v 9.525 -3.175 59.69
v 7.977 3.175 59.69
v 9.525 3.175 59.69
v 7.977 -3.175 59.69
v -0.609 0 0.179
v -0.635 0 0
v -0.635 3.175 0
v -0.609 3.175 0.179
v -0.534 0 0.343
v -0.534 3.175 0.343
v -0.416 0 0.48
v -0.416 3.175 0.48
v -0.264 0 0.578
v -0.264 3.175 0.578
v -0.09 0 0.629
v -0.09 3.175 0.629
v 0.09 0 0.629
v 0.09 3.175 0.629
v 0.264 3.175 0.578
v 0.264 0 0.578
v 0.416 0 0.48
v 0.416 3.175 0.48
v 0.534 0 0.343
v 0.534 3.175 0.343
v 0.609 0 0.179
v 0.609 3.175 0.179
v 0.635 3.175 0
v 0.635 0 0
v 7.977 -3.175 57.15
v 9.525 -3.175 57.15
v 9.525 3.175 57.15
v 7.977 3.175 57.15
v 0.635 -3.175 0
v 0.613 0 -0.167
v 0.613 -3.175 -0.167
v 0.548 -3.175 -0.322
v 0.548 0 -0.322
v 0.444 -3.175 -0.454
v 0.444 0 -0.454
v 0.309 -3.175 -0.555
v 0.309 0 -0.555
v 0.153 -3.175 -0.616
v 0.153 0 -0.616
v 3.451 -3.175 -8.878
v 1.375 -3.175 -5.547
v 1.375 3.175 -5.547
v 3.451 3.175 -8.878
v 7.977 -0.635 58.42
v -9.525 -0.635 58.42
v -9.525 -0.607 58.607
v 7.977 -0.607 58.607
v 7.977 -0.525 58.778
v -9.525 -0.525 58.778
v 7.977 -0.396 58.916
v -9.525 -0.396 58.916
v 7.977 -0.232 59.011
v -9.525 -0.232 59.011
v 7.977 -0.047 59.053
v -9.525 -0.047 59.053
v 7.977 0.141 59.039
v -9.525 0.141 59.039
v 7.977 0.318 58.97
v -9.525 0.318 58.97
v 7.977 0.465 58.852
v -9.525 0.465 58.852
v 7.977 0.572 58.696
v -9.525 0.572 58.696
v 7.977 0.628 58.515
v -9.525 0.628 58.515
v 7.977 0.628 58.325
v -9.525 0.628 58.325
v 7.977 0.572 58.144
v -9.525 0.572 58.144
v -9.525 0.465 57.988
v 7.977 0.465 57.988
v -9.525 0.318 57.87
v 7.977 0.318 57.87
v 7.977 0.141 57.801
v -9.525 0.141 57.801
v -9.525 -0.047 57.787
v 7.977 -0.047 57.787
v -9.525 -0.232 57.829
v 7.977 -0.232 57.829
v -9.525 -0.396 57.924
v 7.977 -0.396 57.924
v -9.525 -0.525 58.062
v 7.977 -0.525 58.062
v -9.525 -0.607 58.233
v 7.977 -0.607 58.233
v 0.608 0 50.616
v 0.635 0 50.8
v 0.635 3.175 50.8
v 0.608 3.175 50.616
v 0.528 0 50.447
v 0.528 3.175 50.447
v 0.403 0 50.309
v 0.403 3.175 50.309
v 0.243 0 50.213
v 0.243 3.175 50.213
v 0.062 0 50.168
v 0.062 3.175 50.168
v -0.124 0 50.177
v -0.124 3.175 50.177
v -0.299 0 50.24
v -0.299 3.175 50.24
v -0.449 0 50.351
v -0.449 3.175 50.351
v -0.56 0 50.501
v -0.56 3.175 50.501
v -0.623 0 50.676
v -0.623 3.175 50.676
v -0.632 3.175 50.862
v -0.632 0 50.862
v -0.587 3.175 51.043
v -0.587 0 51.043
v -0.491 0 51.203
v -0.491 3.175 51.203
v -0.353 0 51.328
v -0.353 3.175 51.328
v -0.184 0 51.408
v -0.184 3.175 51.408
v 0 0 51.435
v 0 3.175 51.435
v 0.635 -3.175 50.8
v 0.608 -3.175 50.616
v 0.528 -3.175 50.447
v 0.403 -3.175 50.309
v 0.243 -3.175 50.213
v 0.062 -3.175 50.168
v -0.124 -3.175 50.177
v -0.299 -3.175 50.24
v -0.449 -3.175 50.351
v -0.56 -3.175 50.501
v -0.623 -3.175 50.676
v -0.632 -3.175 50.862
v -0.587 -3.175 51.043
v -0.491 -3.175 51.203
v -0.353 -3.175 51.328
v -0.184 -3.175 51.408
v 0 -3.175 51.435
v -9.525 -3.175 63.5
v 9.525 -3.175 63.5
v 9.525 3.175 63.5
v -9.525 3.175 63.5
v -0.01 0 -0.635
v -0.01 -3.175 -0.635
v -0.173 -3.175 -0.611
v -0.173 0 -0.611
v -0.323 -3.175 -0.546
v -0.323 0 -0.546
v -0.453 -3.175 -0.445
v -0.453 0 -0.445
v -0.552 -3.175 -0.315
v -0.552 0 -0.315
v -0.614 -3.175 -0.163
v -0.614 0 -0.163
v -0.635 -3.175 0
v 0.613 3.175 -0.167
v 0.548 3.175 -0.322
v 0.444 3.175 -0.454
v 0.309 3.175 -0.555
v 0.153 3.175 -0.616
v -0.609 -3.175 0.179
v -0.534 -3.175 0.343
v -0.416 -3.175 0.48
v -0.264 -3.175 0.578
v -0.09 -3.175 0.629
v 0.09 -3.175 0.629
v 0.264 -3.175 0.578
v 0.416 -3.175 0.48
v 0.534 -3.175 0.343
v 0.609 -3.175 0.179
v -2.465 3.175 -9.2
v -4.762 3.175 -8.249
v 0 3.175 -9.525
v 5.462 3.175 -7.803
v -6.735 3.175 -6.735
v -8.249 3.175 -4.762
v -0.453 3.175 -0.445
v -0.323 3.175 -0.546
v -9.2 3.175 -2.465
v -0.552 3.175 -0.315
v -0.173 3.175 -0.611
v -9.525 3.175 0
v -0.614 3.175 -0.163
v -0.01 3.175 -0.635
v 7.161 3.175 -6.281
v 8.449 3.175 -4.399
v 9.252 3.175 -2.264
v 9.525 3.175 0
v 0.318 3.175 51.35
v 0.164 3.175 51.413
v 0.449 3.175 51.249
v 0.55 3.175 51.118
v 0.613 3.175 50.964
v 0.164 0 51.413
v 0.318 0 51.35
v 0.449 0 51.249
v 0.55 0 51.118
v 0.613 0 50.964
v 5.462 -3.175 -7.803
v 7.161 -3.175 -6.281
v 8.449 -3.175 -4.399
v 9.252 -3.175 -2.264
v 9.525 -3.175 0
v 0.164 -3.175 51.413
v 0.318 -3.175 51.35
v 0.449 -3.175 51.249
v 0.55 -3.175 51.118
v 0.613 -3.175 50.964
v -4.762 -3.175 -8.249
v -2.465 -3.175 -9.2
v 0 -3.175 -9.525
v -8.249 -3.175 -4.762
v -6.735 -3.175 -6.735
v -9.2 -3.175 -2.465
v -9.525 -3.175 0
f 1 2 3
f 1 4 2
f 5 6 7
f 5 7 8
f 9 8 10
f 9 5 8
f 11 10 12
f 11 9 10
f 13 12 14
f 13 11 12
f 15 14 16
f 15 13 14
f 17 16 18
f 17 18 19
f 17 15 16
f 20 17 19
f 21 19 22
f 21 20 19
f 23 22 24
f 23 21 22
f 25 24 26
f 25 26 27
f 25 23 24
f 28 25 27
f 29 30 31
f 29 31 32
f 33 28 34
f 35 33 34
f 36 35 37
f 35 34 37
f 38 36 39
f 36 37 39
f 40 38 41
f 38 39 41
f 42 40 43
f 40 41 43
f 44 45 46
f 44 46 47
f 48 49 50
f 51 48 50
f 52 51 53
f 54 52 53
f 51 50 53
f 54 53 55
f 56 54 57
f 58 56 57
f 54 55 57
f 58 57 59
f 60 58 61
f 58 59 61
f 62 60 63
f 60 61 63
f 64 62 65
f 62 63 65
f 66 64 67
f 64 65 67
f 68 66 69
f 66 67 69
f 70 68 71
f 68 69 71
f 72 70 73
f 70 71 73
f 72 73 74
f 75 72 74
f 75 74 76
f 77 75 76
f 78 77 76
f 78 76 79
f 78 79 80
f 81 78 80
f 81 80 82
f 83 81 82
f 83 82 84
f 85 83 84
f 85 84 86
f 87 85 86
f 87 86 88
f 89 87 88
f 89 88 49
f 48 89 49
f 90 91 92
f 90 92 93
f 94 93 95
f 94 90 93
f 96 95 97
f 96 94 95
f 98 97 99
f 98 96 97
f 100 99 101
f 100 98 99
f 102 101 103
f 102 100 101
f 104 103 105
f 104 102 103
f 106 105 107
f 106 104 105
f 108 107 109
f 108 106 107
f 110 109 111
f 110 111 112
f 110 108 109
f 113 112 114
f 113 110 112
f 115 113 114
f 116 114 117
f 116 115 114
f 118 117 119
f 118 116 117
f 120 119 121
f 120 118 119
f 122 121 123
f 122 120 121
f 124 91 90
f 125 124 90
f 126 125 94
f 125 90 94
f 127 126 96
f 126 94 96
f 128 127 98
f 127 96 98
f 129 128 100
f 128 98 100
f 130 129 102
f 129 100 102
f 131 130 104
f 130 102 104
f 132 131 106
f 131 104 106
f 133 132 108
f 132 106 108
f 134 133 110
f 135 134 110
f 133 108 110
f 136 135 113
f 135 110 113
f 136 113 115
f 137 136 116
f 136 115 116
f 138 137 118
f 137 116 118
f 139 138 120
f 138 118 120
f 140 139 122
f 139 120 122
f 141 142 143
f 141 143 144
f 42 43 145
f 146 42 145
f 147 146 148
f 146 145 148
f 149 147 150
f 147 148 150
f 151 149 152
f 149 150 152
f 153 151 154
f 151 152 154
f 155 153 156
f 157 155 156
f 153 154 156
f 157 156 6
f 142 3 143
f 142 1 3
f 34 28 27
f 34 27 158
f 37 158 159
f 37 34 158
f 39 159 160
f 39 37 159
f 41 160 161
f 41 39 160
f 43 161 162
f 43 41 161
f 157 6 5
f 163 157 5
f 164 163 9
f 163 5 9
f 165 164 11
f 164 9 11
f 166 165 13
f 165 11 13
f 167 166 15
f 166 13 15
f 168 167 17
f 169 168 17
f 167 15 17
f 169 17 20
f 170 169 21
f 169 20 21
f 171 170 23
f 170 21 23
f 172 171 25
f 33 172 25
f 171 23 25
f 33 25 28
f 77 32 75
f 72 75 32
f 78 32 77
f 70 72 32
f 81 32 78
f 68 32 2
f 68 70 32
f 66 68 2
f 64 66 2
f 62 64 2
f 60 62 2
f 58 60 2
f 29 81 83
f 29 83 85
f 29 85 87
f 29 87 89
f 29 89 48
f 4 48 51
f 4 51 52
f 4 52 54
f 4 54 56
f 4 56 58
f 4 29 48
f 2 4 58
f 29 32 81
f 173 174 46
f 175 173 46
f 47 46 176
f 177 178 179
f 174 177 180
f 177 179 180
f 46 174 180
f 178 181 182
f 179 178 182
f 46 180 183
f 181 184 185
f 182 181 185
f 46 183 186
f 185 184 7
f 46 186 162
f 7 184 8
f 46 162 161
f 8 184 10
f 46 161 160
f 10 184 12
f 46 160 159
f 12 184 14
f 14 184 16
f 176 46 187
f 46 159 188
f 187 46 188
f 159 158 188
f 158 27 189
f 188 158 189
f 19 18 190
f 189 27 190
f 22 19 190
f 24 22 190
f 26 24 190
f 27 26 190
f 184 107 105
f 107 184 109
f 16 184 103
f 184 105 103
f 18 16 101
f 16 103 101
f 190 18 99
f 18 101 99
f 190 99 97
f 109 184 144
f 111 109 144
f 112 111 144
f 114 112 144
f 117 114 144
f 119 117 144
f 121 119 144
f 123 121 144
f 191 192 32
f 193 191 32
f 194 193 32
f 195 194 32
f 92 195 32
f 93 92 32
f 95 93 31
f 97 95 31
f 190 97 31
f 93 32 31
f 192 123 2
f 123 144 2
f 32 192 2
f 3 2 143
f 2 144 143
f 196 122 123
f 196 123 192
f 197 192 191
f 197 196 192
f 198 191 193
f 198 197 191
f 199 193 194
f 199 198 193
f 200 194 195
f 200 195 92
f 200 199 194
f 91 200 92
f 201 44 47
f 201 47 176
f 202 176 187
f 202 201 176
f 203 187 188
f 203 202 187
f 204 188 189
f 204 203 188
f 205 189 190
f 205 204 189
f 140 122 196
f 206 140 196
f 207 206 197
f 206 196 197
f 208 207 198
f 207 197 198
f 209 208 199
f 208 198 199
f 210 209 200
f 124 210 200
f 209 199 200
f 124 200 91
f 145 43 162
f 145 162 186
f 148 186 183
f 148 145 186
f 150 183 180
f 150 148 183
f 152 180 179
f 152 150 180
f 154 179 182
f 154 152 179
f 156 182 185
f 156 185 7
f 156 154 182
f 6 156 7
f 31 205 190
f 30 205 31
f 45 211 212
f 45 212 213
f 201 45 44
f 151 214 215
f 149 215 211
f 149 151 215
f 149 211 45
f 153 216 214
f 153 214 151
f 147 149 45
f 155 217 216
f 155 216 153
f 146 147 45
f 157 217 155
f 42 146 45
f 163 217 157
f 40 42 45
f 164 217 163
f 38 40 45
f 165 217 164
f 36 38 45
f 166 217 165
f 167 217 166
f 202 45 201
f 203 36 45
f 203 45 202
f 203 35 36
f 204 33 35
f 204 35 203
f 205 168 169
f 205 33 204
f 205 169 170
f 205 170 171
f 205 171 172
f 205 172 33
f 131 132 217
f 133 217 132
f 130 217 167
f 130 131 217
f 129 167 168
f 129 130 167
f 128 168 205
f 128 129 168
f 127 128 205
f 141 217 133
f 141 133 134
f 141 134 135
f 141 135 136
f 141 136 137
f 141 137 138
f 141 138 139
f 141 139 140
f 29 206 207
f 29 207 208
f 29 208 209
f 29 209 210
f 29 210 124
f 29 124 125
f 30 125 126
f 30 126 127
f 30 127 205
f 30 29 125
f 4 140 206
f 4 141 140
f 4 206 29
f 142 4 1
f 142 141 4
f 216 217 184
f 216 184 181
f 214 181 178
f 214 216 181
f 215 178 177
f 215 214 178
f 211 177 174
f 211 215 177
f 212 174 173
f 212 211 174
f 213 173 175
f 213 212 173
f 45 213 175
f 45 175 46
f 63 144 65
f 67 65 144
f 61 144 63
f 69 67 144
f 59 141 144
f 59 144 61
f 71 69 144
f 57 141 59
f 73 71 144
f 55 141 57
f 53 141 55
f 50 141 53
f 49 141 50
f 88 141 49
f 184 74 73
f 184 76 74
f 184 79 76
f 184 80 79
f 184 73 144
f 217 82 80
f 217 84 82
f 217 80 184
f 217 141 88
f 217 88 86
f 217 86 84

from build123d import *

# Parameters (mm, degrees)
F1_DEPTH = 3.175
F3_D     = 1.27


# Not quite as in the source:
# - a feature names something its author has since deleted; it is built from what else it names


with BuildPart() as f1:
    # F0 (on Front) → F1 (new body, symmetric)
    with BuildSketch(Plane.XZ):
        with BuildLine():
            Line((9.525, 59.69), (9.525, 63.5))
            Line((9.525, 63.5), (0, 63.5))
            Line((0, 63.5), (-9.525, 63.5))
            Line((-9.525, 63.5), (-9.525, 0))
            Line((-9.525, 0), (-0.635, 0))
            ThreePointArc((-0.635, 0), (0, 0.635), (0.635, 0))
            Line((0.635, 0), (9.525, 0))
            Line((9.525, 0), (9.525, 57.15))
            Line((9.525, 57.15), (7.9769473523, 57.15))
            Line((7.9769473523, 57.15), (7.9769473523, 59.69))
            Line((7.9769473523, 59.69), (9.525, 59.69))
        make_face()
        with BuildLine():
            ThreePointArc((0.635, 50.8), (-0.4490128061, 50.3509871939), (0, 51.435))
            ThreePointArc((0, 51.435), (0.4490128061, 51.2490128061), (0.635, 50.8))
        make_face(mode=Mode.SUBTRACT)
        with BuildLine():
            ThreePointArc((3.450873254, -8.8778994579), (7.861144724, -5.3784782818), (9.525, 0))
            Line((9.525, 0), (0.635, 0))
            ThreePointArc((0.635, 0), (0.5001354304, -0.3912665987), (0.1528281851, -0.6163347677))
            Line((0.1528281851, -0.6163347677), (1.3754536657, -5.5470129091))
            Line((1.3754536657, -5.5470129091), (3.450873254, -8.8778994579))
        make_face()
        with BuildLine():
            Line((-0.635, 0), (-9.525, 0))
            ThreePointArc((-9.525, 0), (-6.7351920908, -6.7351920908), (0, -9.525))
            Line((0, -9.525), (1.3754536657, -5.5470129091))
            Line((1.3754536657, -5.5470129091), (0.1528281851, -0.6163347677))
            ThreePointArc((0.1528281851, -0.6163347677), (-0.3912665987, -0.5001354304), (-0.635, 0))
        make_face()
    extrude(amount=F1_DEPTH, both=True)

    # F3 (through all)
    with Locations(Plane.YZ.offset(9.525)):
        with Locations((0, 58.42)):
            Hole(F3_D / 2)


solid = f1.part
